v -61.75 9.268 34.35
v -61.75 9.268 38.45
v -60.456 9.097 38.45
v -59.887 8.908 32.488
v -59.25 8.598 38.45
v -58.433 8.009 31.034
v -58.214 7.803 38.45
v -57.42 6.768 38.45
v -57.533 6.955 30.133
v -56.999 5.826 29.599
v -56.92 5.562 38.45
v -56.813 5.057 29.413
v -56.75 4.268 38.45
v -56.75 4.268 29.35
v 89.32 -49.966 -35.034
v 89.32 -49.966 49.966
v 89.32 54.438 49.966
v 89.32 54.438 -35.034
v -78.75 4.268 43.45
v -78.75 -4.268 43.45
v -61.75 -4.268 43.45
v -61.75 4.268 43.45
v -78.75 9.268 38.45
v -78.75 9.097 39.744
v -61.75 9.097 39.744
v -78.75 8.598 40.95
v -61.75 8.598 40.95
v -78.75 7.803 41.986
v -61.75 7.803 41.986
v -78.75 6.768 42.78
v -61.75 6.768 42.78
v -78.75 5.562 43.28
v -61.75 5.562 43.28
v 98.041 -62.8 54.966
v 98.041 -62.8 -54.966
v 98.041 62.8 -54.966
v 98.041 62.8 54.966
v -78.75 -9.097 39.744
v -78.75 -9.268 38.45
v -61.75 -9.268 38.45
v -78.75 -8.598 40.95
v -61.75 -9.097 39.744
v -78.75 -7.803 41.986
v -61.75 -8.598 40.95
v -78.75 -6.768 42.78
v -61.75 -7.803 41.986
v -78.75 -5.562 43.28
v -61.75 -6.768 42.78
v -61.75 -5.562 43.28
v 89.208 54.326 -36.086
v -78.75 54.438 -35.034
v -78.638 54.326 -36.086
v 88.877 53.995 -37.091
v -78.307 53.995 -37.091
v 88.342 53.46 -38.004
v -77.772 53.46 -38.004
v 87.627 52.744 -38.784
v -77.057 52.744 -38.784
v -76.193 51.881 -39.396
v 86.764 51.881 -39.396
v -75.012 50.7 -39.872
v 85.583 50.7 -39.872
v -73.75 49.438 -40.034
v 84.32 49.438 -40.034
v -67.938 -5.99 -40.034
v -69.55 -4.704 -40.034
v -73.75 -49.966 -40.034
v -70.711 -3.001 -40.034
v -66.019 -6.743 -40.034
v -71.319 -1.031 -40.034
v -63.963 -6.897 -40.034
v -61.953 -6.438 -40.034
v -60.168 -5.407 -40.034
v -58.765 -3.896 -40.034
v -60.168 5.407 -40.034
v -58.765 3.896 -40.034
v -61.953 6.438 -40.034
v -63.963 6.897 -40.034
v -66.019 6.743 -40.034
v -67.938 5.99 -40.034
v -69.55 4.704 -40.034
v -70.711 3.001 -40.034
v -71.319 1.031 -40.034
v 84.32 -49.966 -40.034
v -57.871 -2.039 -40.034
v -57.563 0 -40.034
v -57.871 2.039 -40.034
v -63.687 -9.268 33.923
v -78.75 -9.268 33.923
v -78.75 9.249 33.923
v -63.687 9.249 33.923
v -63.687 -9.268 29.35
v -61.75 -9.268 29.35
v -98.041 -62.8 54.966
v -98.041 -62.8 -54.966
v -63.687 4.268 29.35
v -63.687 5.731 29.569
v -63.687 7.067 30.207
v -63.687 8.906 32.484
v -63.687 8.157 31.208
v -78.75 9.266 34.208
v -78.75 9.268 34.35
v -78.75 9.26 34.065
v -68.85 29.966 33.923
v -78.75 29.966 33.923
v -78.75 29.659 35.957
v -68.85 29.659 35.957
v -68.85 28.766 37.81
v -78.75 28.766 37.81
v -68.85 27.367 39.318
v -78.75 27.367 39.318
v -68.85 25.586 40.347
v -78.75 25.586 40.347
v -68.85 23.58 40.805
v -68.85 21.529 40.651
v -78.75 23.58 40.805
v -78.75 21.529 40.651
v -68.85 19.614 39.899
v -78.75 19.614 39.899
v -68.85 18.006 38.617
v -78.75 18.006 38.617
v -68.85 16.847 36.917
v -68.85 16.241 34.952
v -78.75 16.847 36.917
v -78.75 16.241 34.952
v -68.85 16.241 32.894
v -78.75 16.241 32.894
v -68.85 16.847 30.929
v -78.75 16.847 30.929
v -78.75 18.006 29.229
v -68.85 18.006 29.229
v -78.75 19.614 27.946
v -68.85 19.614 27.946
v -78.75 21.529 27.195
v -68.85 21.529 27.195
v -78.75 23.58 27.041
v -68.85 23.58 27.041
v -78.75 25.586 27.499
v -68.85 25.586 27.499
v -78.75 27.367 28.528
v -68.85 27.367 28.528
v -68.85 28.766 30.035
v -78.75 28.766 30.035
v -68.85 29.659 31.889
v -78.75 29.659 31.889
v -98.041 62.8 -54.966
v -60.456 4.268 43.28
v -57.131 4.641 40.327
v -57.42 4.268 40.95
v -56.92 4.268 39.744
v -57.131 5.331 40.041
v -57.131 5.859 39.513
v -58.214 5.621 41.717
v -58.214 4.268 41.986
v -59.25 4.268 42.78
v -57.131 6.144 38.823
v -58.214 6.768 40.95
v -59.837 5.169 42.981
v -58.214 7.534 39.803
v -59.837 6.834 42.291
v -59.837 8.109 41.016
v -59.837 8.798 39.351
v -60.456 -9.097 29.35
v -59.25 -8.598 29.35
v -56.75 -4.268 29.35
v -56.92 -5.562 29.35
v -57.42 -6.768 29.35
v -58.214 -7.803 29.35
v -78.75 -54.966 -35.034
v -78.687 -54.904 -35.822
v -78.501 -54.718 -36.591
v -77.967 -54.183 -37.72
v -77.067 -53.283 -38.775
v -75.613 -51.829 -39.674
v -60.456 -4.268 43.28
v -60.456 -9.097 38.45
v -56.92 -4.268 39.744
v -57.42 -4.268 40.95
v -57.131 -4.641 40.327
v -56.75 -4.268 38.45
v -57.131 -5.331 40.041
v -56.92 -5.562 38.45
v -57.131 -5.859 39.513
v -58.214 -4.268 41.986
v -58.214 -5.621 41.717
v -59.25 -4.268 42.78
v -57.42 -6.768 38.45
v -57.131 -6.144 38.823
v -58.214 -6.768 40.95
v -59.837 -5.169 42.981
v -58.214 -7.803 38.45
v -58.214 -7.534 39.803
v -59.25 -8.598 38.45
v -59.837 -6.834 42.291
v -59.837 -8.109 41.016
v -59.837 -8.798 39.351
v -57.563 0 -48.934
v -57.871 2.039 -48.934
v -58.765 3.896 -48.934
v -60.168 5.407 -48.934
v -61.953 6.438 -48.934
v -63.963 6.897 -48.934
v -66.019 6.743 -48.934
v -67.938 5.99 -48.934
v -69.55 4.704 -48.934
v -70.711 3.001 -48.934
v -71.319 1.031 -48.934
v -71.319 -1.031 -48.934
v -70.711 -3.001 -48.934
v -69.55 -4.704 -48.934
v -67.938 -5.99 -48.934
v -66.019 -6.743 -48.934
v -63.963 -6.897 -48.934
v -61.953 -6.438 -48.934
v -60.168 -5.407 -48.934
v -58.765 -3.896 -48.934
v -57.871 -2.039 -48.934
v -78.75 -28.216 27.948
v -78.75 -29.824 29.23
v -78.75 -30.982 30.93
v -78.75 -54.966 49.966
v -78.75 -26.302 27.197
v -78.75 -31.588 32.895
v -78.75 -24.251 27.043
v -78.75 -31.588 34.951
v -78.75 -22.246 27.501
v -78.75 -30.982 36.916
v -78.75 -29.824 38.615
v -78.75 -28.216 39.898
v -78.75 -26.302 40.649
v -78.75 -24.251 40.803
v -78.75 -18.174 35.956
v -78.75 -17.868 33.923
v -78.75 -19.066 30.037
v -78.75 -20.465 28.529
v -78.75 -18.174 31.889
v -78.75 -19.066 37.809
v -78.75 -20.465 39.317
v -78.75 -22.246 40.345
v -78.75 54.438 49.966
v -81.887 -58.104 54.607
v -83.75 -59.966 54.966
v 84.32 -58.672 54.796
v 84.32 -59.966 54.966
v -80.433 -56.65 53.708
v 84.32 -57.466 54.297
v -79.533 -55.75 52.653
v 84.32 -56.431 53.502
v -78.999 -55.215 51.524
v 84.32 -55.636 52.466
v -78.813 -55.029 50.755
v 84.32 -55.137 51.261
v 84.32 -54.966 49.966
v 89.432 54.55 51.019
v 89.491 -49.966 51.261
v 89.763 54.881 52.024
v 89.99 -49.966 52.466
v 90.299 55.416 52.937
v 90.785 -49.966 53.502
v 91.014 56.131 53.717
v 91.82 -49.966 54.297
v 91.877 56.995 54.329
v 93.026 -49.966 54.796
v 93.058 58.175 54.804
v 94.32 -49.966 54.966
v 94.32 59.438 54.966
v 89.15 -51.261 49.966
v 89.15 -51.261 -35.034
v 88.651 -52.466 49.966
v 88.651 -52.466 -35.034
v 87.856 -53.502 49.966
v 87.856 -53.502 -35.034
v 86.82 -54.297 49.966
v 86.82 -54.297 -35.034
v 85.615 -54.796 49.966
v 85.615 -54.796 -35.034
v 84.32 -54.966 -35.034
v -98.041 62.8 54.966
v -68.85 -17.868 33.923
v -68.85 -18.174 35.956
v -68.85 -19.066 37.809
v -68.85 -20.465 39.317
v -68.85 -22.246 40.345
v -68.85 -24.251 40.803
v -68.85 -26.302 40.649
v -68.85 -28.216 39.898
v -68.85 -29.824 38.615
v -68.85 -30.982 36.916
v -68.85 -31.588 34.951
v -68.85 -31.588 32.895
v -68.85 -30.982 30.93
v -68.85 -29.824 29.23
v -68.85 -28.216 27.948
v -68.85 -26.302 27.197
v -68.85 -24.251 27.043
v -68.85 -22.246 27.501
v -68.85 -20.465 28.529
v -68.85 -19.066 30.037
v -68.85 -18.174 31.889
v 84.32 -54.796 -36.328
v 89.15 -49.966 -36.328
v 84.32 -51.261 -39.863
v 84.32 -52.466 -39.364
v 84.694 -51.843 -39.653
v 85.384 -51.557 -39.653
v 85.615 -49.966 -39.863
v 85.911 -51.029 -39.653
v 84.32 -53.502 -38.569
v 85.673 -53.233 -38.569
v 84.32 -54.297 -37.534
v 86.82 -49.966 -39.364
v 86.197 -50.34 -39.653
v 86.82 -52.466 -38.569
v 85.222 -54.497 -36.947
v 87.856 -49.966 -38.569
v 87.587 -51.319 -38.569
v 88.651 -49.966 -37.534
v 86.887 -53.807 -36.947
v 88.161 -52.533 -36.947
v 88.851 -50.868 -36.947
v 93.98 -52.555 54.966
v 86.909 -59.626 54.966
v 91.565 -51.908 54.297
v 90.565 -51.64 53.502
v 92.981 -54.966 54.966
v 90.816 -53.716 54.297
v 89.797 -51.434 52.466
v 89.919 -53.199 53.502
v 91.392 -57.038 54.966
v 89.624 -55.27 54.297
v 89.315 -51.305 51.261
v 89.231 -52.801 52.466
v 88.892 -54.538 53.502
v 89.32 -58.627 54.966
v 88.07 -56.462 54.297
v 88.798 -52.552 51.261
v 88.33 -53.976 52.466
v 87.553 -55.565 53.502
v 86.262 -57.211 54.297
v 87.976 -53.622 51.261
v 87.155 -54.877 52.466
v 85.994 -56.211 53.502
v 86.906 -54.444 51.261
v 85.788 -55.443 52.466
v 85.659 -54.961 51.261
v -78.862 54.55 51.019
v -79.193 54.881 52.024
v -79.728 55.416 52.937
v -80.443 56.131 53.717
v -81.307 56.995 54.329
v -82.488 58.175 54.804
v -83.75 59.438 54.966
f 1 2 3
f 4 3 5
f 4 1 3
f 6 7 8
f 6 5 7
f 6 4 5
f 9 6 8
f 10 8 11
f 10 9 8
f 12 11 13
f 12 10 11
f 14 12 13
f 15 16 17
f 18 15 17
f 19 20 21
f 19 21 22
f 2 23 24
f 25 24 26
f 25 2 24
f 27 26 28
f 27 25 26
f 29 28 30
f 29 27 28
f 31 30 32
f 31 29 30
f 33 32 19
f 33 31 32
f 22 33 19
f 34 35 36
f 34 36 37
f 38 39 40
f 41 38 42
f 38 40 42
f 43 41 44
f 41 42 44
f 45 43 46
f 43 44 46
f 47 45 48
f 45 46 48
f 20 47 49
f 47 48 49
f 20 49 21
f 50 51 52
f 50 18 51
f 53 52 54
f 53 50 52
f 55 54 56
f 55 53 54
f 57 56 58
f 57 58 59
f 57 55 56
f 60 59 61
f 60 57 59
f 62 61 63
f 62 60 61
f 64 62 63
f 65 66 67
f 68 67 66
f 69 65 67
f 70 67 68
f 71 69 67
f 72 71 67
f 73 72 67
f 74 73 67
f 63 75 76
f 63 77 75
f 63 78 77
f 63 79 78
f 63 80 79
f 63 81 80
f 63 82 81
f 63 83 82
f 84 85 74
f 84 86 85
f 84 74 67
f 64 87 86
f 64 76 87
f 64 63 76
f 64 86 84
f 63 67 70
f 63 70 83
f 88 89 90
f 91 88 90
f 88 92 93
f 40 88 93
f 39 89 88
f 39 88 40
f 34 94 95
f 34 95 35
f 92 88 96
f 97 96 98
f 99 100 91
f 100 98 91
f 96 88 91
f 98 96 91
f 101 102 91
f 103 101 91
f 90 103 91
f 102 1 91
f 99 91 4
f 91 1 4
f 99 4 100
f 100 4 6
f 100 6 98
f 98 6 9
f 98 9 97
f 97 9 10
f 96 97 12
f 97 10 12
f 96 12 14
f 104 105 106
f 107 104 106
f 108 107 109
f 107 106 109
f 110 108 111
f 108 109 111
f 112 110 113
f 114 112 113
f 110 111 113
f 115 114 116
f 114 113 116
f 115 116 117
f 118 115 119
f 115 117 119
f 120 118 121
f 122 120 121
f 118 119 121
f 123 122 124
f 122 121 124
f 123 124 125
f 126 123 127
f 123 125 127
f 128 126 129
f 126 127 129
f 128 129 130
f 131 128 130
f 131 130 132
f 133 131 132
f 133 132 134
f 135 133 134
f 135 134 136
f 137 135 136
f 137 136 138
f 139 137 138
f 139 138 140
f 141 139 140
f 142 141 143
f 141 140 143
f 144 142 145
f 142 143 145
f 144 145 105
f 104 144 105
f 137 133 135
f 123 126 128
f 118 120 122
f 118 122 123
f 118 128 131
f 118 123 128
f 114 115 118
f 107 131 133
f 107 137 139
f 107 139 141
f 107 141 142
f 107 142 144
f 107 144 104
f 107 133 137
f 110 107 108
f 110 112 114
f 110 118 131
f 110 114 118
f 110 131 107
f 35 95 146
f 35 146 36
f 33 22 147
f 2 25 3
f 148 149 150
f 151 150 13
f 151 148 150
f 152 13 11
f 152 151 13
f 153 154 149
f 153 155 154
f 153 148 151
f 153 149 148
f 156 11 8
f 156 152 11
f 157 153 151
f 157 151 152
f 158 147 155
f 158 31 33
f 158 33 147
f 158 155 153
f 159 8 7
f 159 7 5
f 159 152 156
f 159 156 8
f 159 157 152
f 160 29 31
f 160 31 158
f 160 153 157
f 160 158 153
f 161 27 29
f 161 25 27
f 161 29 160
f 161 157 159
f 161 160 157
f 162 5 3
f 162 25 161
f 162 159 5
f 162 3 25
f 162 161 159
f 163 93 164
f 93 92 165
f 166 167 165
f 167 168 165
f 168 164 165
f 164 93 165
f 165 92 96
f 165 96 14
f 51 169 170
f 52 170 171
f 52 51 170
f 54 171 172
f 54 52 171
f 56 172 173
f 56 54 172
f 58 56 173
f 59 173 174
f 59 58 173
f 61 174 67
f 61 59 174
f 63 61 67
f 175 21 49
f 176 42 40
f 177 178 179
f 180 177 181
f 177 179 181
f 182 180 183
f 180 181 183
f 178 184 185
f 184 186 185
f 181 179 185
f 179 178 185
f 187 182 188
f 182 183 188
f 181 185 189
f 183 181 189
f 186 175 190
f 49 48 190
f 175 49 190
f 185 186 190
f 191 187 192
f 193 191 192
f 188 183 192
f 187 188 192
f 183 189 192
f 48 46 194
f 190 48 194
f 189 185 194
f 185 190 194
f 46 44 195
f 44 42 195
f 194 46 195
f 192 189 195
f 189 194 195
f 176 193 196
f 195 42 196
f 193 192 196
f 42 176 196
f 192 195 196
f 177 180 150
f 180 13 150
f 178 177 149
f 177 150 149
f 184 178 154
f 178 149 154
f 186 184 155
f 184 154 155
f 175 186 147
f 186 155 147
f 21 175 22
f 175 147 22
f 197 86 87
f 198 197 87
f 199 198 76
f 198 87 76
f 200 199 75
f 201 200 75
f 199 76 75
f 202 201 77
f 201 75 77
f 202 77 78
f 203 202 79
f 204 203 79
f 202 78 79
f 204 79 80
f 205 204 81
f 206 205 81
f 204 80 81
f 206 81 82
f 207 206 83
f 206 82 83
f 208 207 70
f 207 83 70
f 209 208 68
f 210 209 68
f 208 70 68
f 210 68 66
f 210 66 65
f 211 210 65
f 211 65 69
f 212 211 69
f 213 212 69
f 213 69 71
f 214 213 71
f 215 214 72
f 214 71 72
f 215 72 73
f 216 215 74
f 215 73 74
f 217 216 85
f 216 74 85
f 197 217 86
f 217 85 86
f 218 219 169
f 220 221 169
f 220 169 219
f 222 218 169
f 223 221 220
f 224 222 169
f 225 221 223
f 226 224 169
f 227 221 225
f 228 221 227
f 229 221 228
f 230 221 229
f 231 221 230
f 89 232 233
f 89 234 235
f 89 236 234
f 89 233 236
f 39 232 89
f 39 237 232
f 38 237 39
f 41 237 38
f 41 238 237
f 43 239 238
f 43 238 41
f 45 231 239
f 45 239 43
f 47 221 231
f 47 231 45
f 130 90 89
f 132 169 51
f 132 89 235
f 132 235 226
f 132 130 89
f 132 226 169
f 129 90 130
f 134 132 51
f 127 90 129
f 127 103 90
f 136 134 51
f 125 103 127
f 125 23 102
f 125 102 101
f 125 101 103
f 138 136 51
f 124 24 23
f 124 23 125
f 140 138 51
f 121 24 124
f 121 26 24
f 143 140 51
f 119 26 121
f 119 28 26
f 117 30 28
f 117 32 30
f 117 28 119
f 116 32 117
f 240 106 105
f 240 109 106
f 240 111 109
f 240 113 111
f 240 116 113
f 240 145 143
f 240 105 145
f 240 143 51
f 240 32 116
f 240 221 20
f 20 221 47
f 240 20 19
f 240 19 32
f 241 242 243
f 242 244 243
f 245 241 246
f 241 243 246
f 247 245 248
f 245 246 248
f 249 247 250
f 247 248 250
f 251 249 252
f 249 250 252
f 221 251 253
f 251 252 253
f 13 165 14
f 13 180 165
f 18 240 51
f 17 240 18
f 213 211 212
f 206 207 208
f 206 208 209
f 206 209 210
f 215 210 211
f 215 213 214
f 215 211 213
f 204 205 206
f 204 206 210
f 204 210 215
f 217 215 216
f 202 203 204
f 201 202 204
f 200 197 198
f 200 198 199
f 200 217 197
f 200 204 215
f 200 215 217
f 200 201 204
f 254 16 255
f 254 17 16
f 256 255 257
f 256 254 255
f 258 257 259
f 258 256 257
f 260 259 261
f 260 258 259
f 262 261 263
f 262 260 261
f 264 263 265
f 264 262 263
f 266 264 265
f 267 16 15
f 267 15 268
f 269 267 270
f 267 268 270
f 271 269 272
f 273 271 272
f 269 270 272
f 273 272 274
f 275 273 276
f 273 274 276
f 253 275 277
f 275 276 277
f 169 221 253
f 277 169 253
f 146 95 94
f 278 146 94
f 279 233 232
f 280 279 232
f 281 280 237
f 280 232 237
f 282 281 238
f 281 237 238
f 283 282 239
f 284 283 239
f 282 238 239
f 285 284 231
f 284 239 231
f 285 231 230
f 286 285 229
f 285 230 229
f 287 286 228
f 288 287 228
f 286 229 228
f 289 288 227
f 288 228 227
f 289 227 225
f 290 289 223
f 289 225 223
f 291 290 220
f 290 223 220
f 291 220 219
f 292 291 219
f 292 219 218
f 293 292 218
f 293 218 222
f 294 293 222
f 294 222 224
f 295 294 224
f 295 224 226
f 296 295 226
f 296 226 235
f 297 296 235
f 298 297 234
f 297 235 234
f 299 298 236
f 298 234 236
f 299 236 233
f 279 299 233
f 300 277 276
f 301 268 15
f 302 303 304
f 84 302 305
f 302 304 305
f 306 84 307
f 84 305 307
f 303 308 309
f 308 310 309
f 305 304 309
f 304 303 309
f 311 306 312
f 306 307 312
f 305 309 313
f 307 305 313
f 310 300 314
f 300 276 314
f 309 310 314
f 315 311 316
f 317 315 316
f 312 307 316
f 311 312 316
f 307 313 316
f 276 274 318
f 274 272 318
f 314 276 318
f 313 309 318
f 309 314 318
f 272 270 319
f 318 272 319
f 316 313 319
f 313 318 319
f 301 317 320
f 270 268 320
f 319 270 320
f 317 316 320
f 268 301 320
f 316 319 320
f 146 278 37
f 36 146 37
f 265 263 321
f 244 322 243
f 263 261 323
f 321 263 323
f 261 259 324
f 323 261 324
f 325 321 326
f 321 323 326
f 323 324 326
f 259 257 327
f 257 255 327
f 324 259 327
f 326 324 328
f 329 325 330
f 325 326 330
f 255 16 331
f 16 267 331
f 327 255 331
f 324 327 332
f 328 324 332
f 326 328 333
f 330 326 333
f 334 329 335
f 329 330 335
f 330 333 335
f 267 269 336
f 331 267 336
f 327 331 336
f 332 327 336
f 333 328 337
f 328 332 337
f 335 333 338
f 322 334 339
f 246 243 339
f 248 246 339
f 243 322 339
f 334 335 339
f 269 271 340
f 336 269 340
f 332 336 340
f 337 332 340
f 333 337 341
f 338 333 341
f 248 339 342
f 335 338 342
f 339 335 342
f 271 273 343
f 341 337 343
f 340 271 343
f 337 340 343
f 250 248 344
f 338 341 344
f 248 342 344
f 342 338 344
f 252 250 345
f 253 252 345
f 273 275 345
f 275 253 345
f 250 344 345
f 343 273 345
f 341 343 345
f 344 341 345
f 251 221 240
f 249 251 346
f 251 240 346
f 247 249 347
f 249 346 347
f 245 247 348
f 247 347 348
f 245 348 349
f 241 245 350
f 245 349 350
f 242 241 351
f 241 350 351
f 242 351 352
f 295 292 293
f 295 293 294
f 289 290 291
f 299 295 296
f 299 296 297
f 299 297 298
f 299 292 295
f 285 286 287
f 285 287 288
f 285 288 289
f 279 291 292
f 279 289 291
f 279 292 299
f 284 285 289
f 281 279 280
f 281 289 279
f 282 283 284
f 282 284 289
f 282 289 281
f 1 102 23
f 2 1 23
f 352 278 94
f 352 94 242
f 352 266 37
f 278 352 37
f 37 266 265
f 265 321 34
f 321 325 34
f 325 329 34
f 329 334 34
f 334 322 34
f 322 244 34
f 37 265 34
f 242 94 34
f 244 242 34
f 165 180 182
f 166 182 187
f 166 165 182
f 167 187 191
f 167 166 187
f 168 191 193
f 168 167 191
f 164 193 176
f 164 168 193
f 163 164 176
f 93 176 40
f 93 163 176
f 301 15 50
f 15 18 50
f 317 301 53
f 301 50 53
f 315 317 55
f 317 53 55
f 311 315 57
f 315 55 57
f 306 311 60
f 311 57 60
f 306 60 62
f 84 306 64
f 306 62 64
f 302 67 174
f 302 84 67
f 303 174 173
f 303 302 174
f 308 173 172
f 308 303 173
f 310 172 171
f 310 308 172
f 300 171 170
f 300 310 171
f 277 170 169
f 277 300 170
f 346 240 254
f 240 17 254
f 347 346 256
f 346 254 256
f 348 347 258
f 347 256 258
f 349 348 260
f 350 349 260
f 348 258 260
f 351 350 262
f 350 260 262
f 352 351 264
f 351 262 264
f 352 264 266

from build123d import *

# Parameters (mm, degrees)
F0_W      = 196.0822343826
F0_H      = 109.9328920245
F1_DEPTH  = 62.8
F2_W      = 168.0704802275
F2_H      = 109.4043701887
F3_DEPTH  = 95
F4_R      = 6.9163922732
F5_DEPTH  = 8.9
F6_W      = 18.5355395079
F6_H      = 9.5271170139
F7_DEPTH  = 22
F8_W      = 6.9370792508
F8_H      = 18.5355395079
F9_DEPTH  = 14.1
F10_R     = 5
F11_R     = 6.8989817164
F11_R_2   = 6.9010656104
F12_DEPTH = 9.9


with BuildPart() as f1:
    # F0 (on Front) → F1 (new body, symmetric)
    with BuildSketch(Plane.XZ):
        Rectangle(F0_W, F0_H)
    extrude(amount=F1_DEPTH, both=True)

    # F2 (on face) → F3 (cut)
    with BuildSketch(Plane.XY.offset(54.9664460123)):
        with Locations((5.2852407098, -0.2642609179)):
            Rectangle(F2_W, F2_H)
    extrude(amount=-F3_DEPTH, mode=Mode.SUBTRACT)

    # F4 (on face) → F5 (cut)
    with BuildSketch(Plane.XY.offset(-40.0335539877)):
        with Locations((-64.4798651338, 0)):
            Circle(F4_R)
    extrude(amount=-F5_DEPTH, mode=Mode.SUBTRACT)

    # F6 (on face) → F7 (join)
    with BuildSketch(Plane.YZ.offset(-78.749999404)):
        with Locations((0, 38.6865362525)):
            Rectangle(F6_W, F6_H)
    extrude(amount=F7_DEPTH)

    # F8 (on face) → F9 (join)
    with BuildSketch(Plane.XY.offset(43.4500947595)):
        with Locations((-60.2185390294, 0)):
            Rectangle(F8_W, F8_H)
    extrude(amount=-F9_DEPTH)

    # F10
    f10_edges = [f1.edges().sort_by_distance(p)[0] for p in [
        (5.285241, -54.966446, 54.966446),
        (89.320481, -54.966446, 7.466446),
        (5.285241, -54.966446, -40.033554),
        (-67.749999, 9.26777, 43.450095),
        (-67.749999, -9.26777, 43.450095),
        (-56.749999, 0, 43.450095),
        (-60.218539, 9.26777, 29.350095),
        (-56.749999, -9.26777, 36.400095),
        (-78.749999, -0.264261, 54.966446),
        (5.285241, 54.437924, 54.966446),
        (-78.749999, -0.264261, -40.033554),
        (5.285241, 54.437924, -40.033554),
        (89.320481, -0.264261, -40.033554),
        (-56.749999, 9.26777, 36.400095),
        (89.320481, -0.264261, 54.966446),
    ]]
    fillet(f10_edges, radius=F10_R)

    # F11 (on face) → F12 (join)
    with BuildSketch(Plane.YZ.offset(-78.749999404)):
        with Locations((-24.7665680945, 33.9229777455)):
            Circle(F11_R)
        with Locations((23.0645500124, 33.9229777455)):
            Circle(F11_R_2)
    extrude(amount=F12_DEPTH)


solid = f1.part
